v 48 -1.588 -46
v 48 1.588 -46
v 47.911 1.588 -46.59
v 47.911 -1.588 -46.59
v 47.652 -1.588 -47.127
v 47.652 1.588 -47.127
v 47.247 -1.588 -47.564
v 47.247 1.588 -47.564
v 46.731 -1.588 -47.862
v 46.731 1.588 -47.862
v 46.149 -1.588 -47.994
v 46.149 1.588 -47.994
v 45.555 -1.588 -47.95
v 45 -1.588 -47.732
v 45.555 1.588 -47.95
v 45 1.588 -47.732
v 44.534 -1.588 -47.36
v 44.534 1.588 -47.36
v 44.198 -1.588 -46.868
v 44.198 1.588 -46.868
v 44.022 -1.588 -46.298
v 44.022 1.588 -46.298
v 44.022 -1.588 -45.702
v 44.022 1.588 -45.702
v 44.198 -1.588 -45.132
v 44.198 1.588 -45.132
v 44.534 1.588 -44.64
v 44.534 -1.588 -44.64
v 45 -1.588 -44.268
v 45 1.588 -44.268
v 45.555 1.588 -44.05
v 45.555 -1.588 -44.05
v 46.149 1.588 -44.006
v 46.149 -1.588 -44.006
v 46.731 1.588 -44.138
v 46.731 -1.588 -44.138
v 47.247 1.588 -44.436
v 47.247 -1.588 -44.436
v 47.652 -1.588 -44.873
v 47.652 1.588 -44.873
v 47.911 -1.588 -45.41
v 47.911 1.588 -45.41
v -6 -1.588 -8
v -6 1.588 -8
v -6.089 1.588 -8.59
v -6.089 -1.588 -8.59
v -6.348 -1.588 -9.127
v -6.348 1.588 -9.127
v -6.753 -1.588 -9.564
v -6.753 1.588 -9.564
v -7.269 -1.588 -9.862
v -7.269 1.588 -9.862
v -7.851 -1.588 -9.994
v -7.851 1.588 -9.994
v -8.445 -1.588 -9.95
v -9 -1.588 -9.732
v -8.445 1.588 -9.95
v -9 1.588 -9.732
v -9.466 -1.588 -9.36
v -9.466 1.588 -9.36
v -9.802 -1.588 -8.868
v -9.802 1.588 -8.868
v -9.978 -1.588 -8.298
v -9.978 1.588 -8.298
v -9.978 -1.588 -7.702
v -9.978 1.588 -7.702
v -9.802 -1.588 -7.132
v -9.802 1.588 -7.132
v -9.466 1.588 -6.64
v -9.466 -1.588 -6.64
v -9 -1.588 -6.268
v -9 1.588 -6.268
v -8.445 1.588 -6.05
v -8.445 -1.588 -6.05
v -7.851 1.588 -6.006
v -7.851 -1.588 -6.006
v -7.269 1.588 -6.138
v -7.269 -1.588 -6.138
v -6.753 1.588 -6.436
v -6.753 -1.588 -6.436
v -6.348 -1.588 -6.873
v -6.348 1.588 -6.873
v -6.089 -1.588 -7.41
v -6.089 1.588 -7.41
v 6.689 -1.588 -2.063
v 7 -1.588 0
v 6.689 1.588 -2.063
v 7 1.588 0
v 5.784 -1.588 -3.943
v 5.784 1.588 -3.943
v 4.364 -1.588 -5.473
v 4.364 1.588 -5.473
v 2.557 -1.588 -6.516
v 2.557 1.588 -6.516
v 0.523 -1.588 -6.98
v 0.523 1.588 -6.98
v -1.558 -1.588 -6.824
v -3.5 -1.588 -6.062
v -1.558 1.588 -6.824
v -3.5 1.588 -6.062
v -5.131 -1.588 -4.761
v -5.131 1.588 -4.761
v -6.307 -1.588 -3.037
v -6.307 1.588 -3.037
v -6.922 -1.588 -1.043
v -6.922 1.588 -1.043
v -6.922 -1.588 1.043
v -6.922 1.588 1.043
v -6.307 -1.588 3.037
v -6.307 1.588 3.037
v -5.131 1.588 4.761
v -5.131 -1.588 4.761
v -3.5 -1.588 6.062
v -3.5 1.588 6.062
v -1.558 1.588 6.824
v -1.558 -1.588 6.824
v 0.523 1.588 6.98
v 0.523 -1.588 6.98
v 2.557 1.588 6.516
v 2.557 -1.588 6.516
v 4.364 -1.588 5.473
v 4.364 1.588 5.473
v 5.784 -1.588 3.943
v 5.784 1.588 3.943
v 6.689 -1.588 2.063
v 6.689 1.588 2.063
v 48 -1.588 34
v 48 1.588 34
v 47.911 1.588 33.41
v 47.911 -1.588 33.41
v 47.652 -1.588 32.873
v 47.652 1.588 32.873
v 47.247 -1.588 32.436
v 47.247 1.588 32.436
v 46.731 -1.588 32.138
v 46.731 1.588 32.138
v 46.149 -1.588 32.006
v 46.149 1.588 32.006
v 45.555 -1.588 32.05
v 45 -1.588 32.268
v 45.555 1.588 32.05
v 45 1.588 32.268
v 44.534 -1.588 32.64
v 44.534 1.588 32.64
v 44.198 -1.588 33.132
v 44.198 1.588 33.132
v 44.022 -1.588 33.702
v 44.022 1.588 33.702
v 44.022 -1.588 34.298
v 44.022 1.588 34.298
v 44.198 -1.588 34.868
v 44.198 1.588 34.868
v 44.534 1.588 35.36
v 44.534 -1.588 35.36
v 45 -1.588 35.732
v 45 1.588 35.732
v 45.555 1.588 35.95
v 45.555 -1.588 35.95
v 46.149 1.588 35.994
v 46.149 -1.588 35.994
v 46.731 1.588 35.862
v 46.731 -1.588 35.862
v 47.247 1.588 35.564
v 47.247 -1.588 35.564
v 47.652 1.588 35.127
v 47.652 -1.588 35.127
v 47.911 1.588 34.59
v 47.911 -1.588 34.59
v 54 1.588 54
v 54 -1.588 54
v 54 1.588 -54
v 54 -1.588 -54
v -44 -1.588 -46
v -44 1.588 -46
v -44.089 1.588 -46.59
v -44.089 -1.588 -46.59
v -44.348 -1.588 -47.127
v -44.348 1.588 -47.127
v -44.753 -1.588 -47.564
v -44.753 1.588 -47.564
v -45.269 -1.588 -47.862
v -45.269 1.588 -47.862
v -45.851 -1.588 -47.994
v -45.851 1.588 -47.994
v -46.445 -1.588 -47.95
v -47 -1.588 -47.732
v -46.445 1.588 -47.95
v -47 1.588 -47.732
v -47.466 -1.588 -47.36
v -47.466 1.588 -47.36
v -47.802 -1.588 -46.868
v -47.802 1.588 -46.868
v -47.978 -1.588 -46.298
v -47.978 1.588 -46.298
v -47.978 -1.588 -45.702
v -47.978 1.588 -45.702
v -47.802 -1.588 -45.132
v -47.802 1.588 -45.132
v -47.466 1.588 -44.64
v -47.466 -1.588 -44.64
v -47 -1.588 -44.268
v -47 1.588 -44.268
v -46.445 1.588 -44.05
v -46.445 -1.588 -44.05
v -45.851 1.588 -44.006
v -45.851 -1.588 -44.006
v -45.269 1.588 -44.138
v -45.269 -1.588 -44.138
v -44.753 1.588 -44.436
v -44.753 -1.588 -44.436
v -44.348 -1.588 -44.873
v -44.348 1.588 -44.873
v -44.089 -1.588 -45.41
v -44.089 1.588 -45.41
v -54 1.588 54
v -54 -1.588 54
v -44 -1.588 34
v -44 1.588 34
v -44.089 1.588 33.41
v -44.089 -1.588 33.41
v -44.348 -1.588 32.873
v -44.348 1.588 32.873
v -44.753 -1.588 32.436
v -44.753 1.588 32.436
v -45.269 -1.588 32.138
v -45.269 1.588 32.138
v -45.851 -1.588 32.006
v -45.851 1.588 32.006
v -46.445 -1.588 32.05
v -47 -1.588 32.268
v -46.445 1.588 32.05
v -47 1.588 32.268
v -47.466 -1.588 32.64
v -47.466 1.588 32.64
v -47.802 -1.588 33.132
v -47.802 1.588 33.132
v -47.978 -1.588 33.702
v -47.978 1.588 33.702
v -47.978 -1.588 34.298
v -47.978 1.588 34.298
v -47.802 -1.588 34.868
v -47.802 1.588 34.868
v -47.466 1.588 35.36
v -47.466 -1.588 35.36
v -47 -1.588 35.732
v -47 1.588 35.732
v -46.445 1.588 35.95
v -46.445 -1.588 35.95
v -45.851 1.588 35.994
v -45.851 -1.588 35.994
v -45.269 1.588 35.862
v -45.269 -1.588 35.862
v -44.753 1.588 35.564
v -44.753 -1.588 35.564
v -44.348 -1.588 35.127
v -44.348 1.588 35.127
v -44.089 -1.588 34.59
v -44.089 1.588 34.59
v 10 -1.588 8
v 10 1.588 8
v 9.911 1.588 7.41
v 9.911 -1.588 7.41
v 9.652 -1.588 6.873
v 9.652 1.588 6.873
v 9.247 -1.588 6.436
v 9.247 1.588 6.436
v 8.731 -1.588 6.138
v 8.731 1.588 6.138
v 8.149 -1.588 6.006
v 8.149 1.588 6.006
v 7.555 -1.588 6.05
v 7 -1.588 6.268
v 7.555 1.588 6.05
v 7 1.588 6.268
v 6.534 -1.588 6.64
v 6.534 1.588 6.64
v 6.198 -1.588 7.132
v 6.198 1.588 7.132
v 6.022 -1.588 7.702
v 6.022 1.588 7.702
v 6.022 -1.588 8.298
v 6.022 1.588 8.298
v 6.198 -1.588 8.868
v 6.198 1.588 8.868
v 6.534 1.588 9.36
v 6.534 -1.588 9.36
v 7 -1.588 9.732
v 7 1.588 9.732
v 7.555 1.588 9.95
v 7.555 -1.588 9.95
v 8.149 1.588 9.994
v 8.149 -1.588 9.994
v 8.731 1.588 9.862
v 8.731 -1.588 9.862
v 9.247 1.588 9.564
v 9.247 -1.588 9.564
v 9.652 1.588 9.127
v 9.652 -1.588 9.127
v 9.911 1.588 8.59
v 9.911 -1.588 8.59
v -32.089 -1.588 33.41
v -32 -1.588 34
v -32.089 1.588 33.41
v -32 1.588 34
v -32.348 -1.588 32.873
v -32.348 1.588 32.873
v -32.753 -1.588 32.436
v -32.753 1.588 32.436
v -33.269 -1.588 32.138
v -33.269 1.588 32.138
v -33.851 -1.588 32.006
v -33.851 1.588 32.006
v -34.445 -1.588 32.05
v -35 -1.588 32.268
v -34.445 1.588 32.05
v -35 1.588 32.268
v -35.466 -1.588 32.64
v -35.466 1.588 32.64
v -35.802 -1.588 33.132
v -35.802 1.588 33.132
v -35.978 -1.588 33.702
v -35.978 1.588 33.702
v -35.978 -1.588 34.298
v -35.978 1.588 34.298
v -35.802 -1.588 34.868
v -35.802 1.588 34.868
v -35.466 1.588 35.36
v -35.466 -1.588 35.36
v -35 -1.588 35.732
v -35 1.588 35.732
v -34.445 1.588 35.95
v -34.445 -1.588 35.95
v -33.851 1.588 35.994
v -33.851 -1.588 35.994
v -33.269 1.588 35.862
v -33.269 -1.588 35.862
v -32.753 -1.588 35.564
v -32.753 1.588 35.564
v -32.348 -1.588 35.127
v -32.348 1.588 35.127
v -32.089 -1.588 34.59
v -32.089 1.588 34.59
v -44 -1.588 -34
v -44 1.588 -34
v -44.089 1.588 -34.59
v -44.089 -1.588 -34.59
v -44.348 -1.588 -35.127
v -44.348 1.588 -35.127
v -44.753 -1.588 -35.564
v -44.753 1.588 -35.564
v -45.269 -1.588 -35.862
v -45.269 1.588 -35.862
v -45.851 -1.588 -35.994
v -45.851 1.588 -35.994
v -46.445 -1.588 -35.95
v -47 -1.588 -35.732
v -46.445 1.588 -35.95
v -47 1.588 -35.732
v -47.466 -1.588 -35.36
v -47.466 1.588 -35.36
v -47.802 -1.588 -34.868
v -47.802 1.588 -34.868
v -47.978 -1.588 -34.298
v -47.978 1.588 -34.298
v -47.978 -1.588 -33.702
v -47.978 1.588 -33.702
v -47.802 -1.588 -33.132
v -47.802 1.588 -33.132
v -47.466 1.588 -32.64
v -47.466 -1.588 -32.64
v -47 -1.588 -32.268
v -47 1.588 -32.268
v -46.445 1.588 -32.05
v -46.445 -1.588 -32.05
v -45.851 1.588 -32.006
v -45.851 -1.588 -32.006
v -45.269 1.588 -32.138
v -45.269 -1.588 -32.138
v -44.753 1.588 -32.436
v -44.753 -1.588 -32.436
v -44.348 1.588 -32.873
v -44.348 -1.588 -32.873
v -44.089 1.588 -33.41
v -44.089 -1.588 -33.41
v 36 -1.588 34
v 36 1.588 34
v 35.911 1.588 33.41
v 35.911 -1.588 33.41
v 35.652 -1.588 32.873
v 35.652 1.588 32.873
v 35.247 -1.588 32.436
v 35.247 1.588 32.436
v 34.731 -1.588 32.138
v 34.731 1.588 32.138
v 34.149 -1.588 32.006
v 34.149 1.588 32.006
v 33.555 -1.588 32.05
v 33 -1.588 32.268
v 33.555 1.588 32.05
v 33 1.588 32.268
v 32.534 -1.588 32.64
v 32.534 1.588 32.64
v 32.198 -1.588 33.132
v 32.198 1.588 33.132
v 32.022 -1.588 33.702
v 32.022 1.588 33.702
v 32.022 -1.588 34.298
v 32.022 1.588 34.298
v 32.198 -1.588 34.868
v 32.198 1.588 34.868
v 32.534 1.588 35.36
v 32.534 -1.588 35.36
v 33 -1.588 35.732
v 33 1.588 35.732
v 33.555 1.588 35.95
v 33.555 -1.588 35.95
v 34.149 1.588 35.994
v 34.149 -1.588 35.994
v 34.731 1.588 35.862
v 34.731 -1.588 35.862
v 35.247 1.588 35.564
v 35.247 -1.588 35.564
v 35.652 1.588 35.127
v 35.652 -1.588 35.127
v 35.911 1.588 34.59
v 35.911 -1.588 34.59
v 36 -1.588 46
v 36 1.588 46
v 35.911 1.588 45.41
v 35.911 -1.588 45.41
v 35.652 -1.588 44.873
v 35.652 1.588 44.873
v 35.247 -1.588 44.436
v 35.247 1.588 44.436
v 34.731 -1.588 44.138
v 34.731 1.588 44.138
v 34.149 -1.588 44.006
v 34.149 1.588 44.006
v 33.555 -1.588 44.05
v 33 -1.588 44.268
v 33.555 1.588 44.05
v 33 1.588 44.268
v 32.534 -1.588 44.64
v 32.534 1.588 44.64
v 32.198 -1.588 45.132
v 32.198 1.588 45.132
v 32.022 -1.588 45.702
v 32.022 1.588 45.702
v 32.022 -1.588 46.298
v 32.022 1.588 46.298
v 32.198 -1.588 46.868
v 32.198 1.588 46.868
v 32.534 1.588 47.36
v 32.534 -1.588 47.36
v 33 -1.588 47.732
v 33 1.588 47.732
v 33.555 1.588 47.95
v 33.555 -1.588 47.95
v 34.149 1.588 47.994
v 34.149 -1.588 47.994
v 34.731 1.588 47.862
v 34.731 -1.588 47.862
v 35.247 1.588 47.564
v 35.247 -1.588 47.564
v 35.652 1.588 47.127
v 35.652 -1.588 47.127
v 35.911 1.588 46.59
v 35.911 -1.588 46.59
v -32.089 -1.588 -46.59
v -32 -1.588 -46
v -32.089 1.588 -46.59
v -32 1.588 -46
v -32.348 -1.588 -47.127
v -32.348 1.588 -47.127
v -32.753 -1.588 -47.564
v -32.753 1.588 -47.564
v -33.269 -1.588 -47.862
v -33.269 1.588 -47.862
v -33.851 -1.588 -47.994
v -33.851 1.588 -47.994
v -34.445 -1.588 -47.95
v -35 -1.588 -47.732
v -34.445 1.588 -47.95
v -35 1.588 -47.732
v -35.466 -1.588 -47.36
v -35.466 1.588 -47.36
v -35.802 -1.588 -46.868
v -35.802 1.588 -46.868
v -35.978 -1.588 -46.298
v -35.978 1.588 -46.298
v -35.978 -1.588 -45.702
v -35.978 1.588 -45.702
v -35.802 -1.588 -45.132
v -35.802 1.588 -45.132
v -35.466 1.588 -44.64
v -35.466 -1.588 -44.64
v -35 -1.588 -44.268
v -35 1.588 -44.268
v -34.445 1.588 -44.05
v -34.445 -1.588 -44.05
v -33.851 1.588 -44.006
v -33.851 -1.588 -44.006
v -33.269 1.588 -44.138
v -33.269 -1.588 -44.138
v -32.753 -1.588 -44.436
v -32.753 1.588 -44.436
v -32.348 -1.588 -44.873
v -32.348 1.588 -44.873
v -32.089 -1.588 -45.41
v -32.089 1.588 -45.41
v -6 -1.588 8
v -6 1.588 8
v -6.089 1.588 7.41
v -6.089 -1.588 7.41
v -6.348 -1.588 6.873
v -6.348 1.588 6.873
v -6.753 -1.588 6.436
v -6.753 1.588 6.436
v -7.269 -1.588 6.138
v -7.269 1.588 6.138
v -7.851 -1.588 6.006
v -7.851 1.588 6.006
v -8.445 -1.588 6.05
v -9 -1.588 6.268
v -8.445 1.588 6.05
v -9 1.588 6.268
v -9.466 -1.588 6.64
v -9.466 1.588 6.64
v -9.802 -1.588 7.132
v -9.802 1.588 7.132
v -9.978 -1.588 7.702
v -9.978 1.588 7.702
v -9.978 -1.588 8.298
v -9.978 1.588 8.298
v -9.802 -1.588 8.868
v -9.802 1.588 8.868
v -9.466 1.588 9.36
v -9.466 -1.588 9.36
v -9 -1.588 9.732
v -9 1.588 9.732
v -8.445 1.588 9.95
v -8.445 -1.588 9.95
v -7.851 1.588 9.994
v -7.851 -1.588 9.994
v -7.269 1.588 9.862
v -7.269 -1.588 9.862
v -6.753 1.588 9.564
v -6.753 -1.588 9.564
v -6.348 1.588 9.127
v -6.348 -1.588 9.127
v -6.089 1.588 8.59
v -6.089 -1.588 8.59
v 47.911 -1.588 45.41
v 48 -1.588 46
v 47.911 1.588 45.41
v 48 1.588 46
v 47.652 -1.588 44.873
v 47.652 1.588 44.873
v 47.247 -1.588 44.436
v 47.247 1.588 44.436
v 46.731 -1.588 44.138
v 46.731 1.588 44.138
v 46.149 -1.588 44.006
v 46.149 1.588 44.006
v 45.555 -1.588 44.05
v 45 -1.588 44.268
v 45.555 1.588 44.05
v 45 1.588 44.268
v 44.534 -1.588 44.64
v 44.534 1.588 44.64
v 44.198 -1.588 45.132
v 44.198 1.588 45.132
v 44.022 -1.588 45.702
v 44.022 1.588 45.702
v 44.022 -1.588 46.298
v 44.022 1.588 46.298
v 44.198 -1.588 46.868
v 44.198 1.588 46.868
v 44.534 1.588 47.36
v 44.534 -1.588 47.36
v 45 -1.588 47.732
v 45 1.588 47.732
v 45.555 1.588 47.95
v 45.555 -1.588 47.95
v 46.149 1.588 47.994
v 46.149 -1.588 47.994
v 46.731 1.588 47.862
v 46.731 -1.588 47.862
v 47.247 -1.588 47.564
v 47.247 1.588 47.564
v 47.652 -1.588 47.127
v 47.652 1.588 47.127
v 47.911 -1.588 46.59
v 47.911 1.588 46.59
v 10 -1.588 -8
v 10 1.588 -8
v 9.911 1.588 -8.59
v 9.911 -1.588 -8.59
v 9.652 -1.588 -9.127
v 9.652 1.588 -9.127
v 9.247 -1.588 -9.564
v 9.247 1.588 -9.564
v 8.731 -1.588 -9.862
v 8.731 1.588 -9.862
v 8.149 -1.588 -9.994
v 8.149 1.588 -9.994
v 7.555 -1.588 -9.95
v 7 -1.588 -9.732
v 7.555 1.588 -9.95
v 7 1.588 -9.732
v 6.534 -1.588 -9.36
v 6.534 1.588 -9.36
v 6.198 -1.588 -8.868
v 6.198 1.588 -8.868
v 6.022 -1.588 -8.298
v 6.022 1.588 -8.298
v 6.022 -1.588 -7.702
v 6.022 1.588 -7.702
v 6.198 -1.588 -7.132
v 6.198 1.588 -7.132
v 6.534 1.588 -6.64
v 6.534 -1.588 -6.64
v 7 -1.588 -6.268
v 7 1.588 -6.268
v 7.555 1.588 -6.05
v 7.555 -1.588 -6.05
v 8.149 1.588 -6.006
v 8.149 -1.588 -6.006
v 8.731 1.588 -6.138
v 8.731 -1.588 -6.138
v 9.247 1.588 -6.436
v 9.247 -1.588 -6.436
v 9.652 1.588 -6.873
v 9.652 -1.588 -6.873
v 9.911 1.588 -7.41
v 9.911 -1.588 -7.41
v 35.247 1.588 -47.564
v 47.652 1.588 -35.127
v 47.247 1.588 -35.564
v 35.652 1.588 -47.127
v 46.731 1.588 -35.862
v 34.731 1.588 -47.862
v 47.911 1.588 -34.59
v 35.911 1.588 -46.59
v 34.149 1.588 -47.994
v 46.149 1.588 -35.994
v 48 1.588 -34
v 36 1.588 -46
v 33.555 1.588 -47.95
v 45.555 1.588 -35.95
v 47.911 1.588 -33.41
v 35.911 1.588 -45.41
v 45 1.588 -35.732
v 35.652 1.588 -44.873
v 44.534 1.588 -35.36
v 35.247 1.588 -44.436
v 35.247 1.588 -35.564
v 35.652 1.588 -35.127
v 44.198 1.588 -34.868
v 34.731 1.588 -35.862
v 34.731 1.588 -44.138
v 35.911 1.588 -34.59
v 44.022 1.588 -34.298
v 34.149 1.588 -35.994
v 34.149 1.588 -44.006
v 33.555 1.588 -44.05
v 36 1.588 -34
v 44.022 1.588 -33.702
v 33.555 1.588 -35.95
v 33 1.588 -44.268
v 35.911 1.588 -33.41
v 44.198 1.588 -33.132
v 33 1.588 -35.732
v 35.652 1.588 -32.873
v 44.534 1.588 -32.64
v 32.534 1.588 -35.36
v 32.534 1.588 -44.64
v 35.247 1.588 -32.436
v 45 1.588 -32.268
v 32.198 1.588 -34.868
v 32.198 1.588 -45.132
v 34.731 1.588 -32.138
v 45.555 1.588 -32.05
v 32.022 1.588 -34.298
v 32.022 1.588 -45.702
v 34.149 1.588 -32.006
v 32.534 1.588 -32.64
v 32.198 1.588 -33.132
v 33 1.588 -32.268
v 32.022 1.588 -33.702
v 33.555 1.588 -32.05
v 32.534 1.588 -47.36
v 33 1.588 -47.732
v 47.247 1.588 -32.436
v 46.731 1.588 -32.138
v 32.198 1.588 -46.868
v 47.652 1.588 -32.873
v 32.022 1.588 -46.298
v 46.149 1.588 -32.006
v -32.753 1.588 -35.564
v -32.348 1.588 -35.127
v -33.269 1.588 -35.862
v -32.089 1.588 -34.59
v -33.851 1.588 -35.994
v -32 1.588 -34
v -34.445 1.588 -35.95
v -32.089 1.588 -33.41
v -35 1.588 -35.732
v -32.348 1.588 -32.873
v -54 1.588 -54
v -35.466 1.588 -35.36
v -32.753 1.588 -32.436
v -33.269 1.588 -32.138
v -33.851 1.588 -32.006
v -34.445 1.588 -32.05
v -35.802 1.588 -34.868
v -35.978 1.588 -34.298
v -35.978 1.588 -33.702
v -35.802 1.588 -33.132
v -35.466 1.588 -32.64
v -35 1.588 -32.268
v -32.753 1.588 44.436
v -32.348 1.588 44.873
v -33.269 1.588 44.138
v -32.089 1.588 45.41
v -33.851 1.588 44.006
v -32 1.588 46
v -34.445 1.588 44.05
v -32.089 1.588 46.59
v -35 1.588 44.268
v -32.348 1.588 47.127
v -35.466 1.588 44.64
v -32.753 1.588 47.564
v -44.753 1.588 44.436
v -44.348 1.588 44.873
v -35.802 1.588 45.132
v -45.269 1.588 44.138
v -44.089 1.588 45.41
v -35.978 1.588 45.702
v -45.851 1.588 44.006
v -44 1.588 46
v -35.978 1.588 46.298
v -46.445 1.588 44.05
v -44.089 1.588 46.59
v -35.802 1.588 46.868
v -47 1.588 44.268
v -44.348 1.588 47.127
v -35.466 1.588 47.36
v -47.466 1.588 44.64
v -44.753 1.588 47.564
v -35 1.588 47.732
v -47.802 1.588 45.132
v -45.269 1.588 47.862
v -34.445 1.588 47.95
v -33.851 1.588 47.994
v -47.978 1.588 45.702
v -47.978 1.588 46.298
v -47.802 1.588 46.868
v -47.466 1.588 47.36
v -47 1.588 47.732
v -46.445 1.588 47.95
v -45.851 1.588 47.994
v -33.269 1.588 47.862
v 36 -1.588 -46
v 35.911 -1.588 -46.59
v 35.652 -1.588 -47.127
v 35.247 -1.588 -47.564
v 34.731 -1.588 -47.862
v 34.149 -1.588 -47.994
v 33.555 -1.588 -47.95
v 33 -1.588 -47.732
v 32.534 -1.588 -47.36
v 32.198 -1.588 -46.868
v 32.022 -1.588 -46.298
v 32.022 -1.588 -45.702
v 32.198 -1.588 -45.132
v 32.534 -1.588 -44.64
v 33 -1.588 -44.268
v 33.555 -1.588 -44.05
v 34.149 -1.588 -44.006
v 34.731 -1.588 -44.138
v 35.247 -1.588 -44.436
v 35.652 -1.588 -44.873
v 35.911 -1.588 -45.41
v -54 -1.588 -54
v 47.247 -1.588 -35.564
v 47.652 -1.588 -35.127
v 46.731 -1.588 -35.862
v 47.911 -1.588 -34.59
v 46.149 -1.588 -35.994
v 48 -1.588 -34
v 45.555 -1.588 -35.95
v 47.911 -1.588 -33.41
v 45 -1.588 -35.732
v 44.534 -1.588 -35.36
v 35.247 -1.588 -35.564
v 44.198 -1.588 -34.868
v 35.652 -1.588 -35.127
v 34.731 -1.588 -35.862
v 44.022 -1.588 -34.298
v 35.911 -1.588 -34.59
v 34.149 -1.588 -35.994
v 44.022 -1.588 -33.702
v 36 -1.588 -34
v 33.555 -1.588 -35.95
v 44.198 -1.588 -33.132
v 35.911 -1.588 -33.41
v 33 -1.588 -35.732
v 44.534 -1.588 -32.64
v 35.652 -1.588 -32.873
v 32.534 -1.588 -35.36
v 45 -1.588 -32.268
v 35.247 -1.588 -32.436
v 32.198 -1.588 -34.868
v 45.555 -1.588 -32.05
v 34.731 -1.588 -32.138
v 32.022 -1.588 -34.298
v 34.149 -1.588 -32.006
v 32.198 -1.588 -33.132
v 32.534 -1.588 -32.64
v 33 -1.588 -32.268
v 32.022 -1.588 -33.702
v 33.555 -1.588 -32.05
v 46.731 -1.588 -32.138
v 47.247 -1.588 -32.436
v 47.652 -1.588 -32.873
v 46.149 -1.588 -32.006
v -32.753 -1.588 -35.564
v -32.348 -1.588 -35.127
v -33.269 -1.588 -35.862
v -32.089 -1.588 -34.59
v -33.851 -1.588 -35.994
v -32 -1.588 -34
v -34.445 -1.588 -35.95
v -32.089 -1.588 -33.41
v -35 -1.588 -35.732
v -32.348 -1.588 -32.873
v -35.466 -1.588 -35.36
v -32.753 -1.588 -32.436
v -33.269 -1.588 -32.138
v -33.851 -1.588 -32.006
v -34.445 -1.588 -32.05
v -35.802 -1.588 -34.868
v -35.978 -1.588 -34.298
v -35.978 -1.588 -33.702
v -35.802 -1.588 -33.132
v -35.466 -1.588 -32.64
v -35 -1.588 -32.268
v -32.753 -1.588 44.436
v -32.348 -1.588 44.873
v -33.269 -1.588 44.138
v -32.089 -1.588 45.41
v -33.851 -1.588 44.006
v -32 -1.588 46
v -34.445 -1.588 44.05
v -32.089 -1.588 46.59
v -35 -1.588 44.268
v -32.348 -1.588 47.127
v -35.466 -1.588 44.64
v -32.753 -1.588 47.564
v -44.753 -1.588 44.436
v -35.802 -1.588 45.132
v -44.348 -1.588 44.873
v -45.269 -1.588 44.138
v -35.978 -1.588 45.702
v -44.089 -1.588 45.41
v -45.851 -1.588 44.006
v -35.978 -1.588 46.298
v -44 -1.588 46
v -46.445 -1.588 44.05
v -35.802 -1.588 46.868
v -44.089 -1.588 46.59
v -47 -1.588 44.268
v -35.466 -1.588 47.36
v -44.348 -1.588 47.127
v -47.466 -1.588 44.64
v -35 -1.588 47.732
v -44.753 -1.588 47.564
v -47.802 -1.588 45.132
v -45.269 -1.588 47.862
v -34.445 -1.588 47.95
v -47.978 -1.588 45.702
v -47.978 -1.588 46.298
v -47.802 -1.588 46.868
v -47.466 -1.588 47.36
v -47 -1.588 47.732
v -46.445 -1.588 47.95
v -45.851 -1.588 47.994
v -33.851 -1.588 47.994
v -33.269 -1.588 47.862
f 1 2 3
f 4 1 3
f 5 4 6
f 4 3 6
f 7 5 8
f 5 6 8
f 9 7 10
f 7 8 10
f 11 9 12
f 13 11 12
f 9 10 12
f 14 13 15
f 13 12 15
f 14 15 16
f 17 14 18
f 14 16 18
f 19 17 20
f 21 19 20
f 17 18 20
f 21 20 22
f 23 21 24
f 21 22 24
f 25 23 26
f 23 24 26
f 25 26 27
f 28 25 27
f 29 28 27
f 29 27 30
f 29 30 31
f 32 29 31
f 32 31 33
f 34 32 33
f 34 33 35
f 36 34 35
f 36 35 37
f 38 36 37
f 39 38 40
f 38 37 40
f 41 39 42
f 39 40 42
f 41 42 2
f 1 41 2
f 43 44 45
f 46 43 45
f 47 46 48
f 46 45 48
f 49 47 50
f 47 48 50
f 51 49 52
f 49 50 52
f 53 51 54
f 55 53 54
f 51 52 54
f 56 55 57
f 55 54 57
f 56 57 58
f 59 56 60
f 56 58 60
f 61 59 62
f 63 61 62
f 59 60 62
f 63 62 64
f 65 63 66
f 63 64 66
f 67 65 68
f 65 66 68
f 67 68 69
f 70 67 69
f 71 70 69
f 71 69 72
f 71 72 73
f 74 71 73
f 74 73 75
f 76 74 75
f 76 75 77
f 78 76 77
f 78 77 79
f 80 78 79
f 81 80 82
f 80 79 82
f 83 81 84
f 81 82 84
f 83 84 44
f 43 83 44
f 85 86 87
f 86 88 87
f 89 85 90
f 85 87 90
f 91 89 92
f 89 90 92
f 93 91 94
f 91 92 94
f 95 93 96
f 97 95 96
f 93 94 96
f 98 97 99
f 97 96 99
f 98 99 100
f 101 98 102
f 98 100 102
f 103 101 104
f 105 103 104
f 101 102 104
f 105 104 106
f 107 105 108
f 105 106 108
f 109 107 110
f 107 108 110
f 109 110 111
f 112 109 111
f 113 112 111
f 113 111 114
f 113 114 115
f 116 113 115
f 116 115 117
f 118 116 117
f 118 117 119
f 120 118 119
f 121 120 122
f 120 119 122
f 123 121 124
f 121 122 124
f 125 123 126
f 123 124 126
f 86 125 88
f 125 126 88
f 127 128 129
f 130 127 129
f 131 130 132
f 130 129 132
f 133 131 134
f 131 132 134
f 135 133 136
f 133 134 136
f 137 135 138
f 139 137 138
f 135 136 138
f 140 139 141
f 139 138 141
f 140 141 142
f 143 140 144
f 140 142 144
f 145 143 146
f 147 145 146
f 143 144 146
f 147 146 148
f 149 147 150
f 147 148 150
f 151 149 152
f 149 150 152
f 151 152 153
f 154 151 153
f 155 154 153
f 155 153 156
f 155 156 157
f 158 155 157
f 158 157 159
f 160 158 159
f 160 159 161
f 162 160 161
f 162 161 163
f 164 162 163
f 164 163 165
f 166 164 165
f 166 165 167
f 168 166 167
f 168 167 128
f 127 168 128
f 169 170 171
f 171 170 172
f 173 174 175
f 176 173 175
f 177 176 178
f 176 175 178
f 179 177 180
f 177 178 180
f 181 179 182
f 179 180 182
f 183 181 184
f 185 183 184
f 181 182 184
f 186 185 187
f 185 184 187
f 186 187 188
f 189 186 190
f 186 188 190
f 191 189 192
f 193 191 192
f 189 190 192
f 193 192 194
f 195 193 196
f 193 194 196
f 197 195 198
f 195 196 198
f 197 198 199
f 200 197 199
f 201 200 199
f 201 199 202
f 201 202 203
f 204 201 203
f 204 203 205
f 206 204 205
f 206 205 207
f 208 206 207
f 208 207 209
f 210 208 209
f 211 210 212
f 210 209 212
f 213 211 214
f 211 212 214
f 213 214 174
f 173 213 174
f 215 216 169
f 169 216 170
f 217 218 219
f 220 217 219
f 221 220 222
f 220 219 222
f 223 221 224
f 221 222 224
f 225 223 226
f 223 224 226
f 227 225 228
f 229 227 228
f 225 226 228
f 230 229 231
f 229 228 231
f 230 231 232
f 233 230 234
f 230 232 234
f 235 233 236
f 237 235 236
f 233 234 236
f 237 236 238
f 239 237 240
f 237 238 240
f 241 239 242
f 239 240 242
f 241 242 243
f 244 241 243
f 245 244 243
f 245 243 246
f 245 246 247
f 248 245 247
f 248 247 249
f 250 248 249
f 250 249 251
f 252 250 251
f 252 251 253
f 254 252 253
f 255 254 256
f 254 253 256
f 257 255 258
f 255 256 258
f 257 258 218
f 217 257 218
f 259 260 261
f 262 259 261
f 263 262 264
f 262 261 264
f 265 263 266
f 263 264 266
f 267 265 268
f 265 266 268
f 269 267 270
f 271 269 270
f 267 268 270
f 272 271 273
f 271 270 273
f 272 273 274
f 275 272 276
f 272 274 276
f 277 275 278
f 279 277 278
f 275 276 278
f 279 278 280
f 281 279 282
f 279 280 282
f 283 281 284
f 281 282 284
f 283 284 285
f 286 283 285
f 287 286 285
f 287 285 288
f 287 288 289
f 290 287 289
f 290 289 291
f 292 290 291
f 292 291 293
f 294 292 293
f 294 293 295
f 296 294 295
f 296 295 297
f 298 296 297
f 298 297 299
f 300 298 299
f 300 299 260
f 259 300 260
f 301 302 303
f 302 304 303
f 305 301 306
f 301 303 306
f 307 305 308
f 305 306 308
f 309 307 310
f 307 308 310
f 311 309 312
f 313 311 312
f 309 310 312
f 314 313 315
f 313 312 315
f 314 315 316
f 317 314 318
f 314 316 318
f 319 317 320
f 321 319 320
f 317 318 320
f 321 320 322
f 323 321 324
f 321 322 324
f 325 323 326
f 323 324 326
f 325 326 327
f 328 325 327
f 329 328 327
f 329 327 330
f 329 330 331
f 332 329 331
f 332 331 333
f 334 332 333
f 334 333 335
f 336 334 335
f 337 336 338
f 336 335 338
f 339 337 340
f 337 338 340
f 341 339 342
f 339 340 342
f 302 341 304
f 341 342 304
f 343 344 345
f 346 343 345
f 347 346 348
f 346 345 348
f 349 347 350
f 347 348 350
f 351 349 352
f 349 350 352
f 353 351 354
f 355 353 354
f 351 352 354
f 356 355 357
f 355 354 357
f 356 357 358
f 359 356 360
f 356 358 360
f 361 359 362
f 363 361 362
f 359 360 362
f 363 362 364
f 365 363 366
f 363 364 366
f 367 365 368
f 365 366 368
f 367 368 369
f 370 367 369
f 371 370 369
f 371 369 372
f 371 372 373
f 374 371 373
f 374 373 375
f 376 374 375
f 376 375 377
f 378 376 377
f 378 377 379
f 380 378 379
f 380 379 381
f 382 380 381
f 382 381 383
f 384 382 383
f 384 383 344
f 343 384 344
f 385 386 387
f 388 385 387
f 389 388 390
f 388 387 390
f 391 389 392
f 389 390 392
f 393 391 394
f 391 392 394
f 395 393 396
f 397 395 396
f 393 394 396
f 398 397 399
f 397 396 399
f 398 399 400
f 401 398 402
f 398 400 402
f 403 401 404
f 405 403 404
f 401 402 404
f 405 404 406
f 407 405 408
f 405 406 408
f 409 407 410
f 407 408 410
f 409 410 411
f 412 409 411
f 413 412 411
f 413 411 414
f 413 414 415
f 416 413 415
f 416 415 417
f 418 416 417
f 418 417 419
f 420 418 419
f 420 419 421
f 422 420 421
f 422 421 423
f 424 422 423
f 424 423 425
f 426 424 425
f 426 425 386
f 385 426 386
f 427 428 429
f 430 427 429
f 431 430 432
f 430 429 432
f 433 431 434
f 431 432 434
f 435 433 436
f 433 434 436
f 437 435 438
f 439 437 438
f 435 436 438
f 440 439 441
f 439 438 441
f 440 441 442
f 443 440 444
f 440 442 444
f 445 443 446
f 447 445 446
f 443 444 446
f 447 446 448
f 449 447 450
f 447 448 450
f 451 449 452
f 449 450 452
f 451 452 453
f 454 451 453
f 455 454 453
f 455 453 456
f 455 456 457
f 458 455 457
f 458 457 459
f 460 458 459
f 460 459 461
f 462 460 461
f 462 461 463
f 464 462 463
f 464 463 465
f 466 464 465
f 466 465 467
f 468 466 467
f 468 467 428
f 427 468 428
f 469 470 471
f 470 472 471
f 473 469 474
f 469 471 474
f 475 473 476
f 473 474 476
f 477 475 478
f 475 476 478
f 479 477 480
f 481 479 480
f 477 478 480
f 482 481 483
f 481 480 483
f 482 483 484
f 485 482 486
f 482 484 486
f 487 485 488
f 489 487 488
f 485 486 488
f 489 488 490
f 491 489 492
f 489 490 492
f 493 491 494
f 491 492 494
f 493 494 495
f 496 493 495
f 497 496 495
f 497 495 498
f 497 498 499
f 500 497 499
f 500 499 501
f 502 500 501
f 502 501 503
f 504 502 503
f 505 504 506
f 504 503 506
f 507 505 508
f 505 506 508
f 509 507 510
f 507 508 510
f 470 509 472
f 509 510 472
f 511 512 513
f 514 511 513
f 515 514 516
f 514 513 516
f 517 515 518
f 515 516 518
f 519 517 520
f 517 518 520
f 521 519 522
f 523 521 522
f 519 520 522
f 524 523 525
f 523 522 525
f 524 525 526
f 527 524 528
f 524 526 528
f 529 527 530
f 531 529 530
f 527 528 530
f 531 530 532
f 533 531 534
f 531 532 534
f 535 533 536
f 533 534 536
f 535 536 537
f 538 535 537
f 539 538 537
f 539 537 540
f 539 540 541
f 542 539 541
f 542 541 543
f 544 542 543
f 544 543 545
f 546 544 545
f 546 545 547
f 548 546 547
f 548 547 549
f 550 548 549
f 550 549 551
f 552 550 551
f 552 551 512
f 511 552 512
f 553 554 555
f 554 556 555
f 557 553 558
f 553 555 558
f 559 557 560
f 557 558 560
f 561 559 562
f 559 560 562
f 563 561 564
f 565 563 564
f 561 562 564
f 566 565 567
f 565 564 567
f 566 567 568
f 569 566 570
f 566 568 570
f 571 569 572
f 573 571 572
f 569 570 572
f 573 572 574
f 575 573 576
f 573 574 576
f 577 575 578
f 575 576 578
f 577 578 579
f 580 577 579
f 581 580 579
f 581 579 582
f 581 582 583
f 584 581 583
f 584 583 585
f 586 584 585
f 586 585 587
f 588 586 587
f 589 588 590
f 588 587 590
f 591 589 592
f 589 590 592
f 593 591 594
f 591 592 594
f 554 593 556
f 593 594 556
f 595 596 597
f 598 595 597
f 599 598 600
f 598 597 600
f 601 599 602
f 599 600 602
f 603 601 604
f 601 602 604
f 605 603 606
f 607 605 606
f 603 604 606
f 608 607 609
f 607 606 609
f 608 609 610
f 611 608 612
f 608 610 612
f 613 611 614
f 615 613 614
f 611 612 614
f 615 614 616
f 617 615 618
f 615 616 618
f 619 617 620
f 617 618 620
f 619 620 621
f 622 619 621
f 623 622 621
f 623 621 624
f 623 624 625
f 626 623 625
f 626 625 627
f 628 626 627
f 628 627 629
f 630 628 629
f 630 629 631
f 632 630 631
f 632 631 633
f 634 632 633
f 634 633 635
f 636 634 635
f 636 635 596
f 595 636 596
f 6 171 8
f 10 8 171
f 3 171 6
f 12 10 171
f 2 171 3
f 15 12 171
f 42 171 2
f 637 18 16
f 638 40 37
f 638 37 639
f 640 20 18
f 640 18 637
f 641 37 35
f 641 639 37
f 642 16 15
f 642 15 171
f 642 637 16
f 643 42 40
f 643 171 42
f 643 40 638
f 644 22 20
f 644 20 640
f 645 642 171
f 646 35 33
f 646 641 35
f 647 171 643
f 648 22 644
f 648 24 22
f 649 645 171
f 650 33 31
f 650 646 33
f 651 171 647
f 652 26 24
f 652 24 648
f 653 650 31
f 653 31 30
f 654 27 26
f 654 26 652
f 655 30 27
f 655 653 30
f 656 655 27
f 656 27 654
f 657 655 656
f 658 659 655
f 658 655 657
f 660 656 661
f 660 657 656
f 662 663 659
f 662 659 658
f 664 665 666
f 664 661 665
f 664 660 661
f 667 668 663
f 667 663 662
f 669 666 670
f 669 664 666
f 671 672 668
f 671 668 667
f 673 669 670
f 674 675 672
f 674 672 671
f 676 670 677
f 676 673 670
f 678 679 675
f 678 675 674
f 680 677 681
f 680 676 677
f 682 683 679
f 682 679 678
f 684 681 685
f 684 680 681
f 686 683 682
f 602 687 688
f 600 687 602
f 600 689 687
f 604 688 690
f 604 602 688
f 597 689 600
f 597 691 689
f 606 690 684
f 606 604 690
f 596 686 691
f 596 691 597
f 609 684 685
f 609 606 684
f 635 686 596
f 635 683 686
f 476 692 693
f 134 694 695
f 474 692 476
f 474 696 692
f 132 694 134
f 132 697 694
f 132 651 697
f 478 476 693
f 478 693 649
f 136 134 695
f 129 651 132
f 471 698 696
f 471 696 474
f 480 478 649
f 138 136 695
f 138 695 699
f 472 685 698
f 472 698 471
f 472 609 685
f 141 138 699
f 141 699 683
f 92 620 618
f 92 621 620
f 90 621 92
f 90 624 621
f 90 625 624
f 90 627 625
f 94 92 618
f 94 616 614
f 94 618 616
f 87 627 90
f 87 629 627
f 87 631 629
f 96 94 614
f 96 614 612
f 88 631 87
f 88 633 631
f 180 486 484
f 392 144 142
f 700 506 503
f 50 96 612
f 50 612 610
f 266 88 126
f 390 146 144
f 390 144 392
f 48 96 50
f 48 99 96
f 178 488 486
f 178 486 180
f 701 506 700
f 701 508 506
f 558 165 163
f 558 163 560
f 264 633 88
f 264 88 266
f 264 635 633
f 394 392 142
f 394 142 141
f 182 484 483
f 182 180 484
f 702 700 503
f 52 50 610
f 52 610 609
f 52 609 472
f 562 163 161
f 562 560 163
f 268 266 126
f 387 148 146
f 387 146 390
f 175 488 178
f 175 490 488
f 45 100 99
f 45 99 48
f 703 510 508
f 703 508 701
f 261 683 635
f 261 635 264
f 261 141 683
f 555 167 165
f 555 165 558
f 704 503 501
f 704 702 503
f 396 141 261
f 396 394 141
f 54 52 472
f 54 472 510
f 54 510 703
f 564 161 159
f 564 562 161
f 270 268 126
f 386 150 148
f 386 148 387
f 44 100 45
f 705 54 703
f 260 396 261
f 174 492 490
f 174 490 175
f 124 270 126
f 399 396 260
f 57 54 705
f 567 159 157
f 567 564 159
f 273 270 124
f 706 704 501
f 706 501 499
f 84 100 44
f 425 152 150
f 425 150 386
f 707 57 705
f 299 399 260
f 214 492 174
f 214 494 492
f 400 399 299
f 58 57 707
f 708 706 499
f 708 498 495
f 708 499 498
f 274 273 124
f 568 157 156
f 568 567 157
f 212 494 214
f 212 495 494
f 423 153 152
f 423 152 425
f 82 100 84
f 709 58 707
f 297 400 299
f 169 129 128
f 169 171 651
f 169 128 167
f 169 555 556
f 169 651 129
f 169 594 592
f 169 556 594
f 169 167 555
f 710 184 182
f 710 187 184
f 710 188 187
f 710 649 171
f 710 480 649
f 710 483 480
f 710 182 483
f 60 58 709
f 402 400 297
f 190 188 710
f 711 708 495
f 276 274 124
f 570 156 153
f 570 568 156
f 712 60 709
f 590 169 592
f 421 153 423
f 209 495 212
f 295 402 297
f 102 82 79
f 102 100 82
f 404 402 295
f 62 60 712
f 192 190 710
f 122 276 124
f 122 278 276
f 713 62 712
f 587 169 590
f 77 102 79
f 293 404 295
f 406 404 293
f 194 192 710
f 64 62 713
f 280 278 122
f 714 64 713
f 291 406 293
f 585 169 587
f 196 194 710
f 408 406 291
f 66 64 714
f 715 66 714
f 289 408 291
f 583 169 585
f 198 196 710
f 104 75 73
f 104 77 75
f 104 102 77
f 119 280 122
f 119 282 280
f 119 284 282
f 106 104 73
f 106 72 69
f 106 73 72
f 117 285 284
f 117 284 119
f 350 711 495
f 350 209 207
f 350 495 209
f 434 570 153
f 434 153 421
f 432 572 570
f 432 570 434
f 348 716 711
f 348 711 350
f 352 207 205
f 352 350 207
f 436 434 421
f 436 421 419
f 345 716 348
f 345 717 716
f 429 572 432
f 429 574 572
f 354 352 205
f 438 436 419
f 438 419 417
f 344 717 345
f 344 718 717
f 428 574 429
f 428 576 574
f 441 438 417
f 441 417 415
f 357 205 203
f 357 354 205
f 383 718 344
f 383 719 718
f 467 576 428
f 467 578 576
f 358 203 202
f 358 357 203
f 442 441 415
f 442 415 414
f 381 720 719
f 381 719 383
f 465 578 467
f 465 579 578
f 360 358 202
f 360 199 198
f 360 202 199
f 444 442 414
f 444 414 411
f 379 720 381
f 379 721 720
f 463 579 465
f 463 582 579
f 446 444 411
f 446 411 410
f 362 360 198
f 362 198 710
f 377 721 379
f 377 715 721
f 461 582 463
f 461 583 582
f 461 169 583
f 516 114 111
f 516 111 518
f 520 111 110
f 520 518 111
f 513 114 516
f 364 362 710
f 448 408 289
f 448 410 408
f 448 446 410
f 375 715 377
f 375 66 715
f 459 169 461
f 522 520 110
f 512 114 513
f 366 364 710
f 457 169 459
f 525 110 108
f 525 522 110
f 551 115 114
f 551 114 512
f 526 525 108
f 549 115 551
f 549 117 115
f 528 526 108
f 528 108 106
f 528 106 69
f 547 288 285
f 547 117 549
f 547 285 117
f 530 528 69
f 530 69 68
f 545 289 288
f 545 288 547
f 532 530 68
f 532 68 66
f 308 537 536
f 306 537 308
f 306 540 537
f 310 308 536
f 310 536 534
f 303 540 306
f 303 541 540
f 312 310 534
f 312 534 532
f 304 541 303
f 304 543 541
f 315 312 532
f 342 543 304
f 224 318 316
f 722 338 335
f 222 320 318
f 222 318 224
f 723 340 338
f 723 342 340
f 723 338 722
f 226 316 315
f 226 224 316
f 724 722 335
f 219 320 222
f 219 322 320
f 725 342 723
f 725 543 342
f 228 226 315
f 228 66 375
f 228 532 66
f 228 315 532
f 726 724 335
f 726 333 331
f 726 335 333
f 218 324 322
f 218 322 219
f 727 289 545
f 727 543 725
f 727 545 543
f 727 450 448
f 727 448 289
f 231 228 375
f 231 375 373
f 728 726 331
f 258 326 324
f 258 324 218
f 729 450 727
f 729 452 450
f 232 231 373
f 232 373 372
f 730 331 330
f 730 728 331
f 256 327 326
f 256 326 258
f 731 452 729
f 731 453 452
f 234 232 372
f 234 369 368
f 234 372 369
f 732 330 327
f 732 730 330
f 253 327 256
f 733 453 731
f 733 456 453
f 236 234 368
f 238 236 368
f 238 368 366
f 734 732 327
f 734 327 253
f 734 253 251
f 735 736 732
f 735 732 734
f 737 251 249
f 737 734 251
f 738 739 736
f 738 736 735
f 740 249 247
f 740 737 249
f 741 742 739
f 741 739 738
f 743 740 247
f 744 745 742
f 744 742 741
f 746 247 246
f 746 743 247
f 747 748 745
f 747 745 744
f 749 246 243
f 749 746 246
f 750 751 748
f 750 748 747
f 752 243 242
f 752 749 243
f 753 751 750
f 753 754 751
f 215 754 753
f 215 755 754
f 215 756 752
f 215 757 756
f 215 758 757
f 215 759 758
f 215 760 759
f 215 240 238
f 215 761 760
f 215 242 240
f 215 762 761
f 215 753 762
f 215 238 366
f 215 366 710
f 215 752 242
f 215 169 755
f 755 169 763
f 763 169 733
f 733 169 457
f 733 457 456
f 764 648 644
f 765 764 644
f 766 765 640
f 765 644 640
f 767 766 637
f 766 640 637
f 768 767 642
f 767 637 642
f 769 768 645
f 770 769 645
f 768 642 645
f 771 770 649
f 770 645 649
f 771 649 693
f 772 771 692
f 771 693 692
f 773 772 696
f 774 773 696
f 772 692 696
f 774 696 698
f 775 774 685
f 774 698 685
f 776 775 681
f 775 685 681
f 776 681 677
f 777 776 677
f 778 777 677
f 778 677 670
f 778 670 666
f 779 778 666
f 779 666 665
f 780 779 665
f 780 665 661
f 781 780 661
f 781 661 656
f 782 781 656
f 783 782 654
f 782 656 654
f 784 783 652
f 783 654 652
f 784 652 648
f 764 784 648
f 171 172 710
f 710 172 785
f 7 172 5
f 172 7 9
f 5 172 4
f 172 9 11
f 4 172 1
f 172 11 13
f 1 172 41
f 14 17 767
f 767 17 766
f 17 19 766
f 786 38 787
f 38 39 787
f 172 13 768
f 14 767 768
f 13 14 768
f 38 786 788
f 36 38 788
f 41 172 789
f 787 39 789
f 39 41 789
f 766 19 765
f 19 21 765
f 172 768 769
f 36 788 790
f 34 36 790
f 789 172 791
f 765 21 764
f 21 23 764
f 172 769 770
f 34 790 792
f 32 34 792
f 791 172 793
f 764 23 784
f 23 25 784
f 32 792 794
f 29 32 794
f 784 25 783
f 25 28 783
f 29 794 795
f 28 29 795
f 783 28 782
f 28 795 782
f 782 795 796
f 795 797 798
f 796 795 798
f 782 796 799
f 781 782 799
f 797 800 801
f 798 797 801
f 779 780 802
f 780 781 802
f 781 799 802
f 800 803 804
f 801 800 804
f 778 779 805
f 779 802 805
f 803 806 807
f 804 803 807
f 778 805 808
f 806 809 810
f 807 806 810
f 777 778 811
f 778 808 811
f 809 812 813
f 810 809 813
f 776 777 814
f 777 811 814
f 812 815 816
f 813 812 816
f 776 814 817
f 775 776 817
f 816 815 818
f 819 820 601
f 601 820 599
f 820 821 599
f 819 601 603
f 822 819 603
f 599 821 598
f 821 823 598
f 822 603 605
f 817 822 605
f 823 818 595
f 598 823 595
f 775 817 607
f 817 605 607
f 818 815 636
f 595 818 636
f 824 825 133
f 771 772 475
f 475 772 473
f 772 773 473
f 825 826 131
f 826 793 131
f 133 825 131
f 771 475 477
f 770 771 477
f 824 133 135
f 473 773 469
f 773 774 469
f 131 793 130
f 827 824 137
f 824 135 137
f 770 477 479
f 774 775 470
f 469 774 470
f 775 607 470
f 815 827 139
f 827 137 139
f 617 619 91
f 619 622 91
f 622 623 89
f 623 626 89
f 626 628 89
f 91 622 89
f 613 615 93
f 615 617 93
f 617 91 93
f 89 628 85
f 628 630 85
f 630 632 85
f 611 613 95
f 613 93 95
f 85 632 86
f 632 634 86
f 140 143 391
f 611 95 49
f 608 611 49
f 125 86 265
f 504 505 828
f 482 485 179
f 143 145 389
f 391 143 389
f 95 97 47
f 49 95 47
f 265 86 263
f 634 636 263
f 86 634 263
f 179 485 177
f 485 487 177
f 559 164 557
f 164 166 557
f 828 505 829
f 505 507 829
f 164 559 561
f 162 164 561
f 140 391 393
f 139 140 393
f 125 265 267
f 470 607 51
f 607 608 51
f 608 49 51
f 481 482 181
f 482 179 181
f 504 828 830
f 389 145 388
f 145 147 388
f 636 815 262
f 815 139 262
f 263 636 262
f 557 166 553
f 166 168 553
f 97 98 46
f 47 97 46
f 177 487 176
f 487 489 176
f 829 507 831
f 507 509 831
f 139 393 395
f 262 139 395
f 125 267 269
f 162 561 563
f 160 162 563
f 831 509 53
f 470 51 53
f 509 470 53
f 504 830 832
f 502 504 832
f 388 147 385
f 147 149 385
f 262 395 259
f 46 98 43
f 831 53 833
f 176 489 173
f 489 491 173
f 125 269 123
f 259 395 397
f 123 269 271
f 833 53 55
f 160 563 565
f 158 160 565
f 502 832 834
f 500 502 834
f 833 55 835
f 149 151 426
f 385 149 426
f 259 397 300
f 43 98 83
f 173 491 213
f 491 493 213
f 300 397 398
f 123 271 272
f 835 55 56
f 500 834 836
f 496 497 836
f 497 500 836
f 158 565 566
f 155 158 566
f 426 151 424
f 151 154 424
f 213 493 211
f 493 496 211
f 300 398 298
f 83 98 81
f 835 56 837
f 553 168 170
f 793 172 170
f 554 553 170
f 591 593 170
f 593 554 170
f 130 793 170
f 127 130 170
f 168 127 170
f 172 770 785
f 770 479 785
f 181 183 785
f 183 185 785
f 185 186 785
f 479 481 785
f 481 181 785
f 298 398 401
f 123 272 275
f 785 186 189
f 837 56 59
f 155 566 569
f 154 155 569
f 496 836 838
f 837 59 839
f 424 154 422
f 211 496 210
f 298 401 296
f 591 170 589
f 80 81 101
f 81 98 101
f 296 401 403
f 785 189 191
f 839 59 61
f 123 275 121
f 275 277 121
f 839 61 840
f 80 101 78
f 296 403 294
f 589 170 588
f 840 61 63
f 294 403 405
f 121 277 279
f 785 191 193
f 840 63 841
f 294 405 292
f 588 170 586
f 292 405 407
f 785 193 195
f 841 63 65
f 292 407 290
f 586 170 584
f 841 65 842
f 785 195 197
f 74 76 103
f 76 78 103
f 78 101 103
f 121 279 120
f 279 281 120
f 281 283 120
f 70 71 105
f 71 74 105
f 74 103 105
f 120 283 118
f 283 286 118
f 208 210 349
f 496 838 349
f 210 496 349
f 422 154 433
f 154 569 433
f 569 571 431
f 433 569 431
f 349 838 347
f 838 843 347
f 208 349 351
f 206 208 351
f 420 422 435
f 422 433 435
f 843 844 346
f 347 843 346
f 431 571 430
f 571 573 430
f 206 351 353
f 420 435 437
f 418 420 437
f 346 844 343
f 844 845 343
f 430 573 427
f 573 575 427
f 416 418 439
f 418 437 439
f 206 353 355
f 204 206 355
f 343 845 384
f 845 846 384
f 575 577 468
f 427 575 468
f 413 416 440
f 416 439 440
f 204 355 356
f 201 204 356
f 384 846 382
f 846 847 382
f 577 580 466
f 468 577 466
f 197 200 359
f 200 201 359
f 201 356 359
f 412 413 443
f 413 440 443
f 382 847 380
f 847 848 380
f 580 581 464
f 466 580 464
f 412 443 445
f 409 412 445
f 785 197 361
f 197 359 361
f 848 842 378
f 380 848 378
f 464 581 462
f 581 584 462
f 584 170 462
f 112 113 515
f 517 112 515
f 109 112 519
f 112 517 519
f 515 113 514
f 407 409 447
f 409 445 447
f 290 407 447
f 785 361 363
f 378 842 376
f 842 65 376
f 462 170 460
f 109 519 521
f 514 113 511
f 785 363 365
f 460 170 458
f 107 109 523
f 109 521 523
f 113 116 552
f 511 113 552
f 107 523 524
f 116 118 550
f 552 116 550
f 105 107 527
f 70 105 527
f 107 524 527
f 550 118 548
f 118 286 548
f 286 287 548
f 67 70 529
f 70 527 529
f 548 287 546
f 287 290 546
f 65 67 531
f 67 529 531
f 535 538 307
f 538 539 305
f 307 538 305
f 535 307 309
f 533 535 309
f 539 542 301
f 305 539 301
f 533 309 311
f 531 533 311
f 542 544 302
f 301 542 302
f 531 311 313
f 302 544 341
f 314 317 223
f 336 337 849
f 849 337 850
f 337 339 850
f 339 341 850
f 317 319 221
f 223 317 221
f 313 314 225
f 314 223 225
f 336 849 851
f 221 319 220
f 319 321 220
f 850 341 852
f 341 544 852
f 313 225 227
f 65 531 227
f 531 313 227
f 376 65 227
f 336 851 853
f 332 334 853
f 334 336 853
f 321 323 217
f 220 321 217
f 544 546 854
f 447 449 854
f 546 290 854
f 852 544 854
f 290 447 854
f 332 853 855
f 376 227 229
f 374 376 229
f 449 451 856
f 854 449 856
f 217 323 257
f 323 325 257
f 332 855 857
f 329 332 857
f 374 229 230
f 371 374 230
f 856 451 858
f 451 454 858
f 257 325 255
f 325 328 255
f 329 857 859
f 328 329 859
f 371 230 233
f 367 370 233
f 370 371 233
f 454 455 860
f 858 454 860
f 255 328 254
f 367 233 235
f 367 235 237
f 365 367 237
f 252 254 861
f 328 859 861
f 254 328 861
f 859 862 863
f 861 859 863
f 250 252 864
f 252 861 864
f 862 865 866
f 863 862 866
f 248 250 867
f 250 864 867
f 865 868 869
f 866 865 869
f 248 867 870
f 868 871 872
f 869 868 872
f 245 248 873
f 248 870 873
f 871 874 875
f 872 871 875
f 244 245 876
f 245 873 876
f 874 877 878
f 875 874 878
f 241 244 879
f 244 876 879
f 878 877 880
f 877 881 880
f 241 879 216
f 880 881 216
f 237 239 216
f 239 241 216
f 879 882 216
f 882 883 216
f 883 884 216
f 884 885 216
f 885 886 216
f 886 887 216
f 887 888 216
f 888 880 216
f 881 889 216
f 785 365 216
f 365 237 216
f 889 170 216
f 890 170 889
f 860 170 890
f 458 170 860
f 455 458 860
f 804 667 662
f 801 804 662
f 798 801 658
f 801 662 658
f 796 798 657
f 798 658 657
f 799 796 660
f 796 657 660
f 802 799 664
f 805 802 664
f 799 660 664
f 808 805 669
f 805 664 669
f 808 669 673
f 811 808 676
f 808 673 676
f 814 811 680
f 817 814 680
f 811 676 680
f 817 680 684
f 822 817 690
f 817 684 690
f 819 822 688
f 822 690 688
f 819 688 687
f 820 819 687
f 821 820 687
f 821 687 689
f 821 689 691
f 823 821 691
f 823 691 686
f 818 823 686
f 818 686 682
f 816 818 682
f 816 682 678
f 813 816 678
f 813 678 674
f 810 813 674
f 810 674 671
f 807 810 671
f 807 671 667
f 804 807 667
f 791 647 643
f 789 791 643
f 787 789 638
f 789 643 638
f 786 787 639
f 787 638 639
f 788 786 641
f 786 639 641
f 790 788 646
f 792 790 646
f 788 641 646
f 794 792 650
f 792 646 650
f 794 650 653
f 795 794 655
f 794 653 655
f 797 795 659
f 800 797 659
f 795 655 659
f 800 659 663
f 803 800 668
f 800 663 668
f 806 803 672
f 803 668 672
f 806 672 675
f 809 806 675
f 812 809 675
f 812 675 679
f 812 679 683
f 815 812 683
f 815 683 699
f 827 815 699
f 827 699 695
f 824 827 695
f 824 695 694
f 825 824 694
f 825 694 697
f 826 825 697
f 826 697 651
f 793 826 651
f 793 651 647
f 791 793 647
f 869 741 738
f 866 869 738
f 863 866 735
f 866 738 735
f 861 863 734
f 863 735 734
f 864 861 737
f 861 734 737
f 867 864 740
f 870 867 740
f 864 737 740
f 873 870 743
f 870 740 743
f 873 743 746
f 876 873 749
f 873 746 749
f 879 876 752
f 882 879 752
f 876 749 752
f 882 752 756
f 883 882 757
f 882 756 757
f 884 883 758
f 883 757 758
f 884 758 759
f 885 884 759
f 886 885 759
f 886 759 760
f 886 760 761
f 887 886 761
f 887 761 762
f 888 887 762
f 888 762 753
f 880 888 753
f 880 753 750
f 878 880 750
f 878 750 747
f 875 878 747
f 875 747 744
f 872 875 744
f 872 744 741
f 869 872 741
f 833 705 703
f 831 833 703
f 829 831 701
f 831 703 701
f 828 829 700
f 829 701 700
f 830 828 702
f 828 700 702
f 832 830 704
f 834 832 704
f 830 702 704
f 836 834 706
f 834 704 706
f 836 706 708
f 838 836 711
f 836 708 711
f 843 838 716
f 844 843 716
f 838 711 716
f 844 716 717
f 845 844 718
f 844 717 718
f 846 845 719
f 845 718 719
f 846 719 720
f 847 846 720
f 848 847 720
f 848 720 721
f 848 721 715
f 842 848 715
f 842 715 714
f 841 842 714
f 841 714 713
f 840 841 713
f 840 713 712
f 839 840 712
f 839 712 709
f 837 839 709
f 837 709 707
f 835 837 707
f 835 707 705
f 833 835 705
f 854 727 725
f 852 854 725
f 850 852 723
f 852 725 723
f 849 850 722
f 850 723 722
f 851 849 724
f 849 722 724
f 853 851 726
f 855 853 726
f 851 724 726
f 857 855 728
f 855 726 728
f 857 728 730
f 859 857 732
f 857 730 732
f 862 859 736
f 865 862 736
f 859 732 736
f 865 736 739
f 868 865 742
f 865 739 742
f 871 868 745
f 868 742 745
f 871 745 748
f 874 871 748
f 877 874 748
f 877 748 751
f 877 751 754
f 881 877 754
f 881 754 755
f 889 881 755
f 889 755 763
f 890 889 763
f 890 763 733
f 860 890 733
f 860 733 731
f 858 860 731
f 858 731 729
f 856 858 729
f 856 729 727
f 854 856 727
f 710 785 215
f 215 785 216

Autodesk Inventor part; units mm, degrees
ref_plane "YZ Plane" through (0, 0, 0) normal (1, 0, 0) x (0, 1, 0)
ref_plane "XZ Plane" through (0, 0, 0) normal (0, 1, 0) x (-1, 0, 0)
ref_plane "XY Plane" through (0, 0, 0) normal (0, 0, 1) x (1, 0, 0)
sketch "Sketch1" plane through (0, 0, 0) normal (0, 1, 0) x (-1, 0, 0)
  line L0 (54, 54) -> (-54, 54)
  line L1 (-54, 54) -> (-54, -54)
  line L2 (-54, -54) -> (54, -54)
  line L3 (54, -54) -> (54, 54)
  line L4 (54, 54) -> (-54, -54) construction
  line L5 (-54, 54) -> (54, -54) construction
  point P0 (0, 0)
  dimension "d0" = 108
  dimension "d1" = 108
extrude "Extrusion1" add sketch "Sketch1" along normal mid plane 3.175
sketch "Sketch2" plane through (0, 1.5875, 0) normal (0, 1, 0) x (1, 0, 0)
  circle A0 centre (-40, -40) radius 2.5 construction
  circle A1 centre (-46, -46) radius 2
  circle A2 centre (-34, -46) radius 2
  circle A3 centre (-34, -34) radius 2
  circle A4 centre (-46, -34) radius 2
  circle A5 centre (34, -46) radius 2
  circle A6 centre (34, -34) radius 2
  circle A7 centre (46, -34) radius 2
  circle A8 centre (46, -46) radius 2
  circle A9 centre (46, 34) radius 2
  circle A10 centre (34, 34) radius 2
  circle A11 centre (34, 46) radius 2
  circle A12 centre (46, 46) radius 2
  circle A13 centre (-34, 46) radius 2
  circle A14 centre (-34, 34) radius 2
  circle A15 centre (-46, 34) radius 2
  circle A16 centre (-46, 46) radius 2
  point P0 (0, 0)
  dimension "d4" = 5
  dimension "d5" = 40
  dimension "d6" = 40
  dimension "d7" = 4
  dimension "d8" = 6
  dimension "d9" = 6
  dimension "d12" = 360
  dimension "d16" = 360
extrude "Extrusion2" cut sketch "Sketch2" against normal through all
sketch "Sketch3" plane through (0, 1.5875, 0) normal (0, 1, 0) x (1, 0, 0)
  circle A0 centre (0, 0) radius 7
  circle A1 centre (-8, 8) radius 2
  circle A2 centre (-8, -8) radius 2
  circle A3 centre (8, -8) radius 2
  circle A4 centre (8, 8) radius 2
  dimension "d20" = 14
  dimension "d21" = 4
  dimension "d22" = 8
  dimension "d23" = 8
  dimension "d26" = 360
extrude "Extrusion3" cut sketch "Sketch3" against normal through all
properties part number "TurretMotorTopPlate"
